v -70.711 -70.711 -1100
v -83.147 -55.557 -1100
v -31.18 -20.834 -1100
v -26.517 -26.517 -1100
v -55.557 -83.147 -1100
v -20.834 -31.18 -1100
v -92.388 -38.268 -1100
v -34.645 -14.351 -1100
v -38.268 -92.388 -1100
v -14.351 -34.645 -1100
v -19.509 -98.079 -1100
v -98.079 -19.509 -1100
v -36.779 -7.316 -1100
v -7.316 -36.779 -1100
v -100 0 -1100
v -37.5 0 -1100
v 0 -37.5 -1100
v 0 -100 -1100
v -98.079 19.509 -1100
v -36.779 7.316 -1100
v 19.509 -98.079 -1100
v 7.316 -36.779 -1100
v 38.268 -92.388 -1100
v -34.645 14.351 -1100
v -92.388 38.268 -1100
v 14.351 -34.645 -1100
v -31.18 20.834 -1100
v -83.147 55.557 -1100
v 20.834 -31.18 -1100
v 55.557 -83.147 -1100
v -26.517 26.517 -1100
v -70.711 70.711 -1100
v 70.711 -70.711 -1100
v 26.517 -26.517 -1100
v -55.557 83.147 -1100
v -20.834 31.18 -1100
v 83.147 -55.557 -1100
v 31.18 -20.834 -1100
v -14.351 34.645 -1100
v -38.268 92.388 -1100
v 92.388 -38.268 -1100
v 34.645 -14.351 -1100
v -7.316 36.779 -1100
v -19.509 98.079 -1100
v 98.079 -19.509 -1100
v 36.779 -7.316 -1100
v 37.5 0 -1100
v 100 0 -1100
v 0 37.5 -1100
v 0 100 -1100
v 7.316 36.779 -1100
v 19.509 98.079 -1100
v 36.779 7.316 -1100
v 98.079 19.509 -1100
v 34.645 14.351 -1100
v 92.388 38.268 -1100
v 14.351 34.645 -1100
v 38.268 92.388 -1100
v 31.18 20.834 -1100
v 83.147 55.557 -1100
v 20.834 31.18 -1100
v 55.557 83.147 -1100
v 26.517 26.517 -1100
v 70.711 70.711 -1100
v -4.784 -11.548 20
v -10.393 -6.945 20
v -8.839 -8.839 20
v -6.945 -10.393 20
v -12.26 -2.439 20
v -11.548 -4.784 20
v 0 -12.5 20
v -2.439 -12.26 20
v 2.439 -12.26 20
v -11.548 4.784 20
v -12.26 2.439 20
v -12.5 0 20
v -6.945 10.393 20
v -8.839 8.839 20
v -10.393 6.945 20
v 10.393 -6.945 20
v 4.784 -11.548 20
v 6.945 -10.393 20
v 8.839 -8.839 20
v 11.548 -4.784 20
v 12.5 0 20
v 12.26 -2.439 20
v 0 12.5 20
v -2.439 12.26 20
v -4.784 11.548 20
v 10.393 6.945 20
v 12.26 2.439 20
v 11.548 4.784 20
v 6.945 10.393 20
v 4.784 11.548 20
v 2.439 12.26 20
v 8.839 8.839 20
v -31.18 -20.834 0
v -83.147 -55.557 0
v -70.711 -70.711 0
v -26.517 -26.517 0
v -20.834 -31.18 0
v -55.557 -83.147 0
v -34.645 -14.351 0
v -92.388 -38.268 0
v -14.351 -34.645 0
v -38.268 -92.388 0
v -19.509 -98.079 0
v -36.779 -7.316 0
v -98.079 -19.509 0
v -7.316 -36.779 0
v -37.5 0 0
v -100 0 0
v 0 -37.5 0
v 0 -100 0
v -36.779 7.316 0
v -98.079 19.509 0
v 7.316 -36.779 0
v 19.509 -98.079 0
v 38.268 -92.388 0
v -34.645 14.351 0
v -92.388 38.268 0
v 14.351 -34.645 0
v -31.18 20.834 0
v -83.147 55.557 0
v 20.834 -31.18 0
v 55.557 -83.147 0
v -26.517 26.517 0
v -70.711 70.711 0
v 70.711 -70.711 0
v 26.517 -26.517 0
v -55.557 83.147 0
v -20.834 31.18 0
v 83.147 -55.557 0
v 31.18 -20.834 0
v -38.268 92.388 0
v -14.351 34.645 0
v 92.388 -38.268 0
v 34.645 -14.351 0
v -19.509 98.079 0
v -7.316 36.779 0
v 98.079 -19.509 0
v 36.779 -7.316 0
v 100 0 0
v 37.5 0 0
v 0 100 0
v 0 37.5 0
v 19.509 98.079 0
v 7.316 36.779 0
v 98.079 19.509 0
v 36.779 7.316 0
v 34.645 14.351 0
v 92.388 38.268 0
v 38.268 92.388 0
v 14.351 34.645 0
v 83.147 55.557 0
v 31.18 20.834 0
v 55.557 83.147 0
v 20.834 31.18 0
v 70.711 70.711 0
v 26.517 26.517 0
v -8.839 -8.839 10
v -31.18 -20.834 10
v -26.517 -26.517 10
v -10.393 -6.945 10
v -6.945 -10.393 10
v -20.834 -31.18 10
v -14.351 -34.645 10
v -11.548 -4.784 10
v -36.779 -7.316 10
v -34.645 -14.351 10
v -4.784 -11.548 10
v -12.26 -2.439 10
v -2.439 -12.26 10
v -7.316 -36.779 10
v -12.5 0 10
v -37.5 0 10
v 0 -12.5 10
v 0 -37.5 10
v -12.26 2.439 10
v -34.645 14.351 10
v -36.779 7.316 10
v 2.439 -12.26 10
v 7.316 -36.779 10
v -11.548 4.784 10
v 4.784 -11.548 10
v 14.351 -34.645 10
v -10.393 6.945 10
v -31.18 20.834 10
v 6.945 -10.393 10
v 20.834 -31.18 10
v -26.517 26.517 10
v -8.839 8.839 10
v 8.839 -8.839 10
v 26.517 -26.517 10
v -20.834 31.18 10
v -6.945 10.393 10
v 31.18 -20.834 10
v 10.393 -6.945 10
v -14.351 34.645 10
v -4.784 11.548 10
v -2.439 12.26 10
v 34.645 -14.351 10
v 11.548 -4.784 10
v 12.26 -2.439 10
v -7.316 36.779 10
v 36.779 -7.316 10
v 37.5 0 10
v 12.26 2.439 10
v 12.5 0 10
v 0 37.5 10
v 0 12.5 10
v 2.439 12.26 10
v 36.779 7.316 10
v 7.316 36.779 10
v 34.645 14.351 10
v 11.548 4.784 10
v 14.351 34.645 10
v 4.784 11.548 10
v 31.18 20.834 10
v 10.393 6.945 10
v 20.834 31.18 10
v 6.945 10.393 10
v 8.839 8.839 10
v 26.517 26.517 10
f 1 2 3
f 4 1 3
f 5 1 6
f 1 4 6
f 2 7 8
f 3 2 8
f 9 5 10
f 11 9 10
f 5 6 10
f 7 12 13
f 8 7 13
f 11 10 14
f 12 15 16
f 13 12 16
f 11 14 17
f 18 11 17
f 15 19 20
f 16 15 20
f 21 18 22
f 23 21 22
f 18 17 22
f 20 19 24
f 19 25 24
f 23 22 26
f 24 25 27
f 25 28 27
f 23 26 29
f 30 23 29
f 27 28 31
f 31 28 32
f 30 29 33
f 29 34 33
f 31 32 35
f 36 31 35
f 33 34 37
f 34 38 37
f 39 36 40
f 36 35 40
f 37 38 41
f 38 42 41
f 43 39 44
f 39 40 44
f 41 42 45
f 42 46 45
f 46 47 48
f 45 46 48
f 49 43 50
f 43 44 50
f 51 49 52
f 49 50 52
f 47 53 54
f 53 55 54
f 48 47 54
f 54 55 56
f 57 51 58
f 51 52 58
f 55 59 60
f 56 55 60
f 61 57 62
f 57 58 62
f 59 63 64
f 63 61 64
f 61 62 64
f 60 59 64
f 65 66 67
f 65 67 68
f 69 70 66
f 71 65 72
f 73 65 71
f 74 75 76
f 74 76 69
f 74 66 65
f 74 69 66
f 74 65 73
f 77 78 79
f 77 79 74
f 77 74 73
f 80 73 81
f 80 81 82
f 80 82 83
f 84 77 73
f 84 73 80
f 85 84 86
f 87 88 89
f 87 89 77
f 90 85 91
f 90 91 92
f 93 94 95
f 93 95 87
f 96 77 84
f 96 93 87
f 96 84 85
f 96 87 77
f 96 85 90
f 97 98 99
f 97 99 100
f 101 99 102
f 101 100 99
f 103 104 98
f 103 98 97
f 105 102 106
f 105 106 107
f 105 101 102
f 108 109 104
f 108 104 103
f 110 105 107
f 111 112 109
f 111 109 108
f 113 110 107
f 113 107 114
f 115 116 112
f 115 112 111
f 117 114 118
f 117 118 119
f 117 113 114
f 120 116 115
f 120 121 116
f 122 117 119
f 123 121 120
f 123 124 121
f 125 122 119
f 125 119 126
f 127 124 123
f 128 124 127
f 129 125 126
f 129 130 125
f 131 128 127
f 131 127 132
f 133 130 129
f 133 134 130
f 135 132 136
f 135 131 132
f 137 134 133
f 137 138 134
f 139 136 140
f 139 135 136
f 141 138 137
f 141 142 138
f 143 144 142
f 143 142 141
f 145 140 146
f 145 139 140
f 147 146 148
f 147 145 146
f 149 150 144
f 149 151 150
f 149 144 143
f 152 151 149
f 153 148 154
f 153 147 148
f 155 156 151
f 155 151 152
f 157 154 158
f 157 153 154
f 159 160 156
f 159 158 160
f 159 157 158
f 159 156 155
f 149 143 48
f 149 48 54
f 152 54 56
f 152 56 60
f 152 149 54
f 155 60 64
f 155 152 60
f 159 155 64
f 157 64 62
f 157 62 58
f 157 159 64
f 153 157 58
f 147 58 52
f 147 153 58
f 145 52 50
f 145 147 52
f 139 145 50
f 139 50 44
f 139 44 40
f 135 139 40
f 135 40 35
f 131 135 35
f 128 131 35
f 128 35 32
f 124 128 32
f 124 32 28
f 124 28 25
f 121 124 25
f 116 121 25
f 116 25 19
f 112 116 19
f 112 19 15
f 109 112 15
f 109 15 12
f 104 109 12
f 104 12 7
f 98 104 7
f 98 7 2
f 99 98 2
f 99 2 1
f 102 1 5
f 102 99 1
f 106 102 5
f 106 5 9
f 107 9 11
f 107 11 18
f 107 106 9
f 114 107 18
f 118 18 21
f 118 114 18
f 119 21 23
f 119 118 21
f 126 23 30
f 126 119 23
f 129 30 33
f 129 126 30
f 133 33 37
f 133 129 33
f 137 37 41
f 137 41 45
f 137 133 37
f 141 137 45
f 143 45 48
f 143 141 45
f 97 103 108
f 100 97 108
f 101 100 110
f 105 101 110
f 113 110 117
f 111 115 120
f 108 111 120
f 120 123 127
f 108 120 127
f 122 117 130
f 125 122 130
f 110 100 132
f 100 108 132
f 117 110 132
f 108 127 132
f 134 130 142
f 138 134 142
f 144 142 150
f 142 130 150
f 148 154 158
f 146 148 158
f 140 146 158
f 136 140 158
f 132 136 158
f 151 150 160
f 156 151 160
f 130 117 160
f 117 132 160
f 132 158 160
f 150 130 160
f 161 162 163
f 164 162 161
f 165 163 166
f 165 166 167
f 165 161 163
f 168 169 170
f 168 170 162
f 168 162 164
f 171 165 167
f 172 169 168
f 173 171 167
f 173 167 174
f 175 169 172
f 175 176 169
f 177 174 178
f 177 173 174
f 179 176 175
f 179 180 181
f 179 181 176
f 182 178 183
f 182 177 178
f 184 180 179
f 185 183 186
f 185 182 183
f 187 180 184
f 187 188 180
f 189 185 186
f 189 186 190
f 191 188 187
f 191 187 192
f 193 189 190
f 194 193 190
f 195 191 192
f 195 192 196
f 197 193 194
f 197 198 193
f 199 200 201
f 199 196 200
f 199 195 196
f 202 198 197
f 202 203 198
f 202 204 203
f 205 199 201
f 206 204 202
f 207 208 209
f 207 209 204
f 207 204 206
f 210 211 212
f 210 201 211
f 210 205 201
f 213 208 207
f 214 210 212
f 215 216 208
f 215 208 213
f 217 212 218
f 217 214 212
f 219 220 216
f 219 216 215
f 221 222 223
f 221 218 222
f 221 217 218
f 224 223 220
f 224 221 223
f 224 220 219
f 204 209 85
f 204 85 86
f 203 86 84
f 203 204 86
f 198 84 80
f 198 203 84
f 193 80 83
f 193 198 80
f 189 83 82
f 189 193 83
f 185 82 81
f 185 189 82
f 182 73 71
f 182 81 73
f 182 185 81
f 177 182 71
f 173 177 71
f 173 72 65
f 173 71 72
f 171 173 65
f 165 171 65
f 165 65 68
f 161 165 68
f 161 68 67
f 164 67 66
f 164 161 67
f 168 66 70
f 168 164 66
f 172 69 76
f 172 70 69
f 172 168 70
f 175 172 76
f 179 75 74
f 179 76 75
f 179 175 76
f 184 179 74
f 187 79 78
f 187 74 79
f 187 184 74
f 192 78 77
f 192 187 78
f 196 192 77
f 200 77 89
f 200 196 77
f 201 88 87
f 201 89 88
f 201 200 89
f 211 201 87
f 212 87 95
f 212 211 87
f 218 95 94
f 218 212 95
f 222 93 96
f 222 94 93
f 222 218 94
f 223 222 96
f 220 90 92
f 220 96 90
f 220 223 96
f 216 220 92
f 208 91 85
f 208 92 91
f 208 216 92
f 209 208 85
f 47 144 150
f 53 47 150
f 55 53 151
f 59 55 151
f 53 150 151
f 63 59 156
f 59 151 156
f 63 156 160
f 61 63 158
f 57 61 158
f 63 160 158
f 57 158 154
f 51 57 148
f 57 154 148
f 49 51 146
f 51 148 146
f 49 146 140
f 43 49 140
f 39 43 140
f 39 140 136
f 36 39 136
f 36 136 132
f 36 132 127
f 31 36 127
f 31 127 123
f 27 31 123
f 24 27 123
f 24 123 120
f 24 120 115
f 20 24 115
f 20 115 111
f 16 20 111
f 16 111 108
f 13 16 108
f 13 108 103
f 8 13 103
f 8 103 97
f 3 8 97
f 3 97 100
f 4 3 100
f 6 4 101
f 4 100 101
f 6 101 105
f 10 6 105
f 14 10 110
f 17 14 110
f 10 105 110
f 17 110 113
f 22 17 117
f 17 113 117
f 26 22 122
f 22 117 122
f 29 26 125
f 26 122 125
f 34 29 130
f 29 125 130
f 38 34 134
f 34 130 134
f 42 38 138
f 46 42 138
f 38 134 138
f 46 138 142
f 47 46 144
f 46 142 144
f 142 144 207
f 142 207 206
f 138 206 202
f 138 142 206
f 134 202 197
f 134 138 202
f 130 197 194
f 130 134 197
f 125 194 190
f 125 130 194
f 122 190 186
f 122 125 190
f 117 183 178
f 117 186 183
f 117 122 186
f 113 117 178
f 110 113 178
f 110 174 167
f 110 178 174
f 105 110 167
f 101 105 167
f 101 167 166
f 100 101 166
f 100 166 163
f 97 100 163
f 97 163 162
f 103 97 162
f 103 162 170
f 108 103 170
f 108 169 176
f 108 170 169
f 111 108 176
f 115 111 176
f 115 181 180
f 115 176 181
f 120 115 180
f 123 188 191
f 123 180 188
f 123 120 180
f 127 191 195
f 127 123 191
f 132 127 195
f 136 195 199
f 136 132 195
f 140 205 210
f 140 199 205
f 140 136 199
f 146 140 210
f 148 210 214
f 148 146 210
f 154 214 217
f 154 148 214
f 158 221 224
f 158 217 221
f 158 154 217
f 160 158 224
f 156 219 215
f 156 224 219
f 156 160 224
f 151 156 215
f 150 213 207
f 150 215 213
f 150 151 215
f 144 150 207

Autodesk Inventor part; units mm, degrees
ref_plane "YZ Plane" through (0, 0, 0) normal (1, 0, 0) x (0, 1, 0)
ref_plane "XZ Plane" through (0, 0, 0) normal (0, 1, 0) x (-1, 0, 0)
ref_plane "XY Plane" through (0, 0, 0) normal (0, 0, 1) x (1, 0, 0)
sketch "Sketch1" plane through (0, 0, 0) normal (0, 0, 1) x (1, 0, 0)
  circle A0 centre (0, 0) radius 37.5
  circle A1 centre (0, 0) radius 12.5
  circle A2 centre (0, 0) radius 100
  dimension "d0" = 75
  dimension "d1" = 25
  dimension "d2" = 200
extrude "Extrusion1" add sketch "Sketch1" against normal blind 1100 contours A2
extrude "Extrusion2" add sketch "Sketch1" along normal blind 10 contours A0
extrude "Extrusion3" add sketch "Sketch1" along normal blind 20 contours A1
properties part number "Teste Limpador"
